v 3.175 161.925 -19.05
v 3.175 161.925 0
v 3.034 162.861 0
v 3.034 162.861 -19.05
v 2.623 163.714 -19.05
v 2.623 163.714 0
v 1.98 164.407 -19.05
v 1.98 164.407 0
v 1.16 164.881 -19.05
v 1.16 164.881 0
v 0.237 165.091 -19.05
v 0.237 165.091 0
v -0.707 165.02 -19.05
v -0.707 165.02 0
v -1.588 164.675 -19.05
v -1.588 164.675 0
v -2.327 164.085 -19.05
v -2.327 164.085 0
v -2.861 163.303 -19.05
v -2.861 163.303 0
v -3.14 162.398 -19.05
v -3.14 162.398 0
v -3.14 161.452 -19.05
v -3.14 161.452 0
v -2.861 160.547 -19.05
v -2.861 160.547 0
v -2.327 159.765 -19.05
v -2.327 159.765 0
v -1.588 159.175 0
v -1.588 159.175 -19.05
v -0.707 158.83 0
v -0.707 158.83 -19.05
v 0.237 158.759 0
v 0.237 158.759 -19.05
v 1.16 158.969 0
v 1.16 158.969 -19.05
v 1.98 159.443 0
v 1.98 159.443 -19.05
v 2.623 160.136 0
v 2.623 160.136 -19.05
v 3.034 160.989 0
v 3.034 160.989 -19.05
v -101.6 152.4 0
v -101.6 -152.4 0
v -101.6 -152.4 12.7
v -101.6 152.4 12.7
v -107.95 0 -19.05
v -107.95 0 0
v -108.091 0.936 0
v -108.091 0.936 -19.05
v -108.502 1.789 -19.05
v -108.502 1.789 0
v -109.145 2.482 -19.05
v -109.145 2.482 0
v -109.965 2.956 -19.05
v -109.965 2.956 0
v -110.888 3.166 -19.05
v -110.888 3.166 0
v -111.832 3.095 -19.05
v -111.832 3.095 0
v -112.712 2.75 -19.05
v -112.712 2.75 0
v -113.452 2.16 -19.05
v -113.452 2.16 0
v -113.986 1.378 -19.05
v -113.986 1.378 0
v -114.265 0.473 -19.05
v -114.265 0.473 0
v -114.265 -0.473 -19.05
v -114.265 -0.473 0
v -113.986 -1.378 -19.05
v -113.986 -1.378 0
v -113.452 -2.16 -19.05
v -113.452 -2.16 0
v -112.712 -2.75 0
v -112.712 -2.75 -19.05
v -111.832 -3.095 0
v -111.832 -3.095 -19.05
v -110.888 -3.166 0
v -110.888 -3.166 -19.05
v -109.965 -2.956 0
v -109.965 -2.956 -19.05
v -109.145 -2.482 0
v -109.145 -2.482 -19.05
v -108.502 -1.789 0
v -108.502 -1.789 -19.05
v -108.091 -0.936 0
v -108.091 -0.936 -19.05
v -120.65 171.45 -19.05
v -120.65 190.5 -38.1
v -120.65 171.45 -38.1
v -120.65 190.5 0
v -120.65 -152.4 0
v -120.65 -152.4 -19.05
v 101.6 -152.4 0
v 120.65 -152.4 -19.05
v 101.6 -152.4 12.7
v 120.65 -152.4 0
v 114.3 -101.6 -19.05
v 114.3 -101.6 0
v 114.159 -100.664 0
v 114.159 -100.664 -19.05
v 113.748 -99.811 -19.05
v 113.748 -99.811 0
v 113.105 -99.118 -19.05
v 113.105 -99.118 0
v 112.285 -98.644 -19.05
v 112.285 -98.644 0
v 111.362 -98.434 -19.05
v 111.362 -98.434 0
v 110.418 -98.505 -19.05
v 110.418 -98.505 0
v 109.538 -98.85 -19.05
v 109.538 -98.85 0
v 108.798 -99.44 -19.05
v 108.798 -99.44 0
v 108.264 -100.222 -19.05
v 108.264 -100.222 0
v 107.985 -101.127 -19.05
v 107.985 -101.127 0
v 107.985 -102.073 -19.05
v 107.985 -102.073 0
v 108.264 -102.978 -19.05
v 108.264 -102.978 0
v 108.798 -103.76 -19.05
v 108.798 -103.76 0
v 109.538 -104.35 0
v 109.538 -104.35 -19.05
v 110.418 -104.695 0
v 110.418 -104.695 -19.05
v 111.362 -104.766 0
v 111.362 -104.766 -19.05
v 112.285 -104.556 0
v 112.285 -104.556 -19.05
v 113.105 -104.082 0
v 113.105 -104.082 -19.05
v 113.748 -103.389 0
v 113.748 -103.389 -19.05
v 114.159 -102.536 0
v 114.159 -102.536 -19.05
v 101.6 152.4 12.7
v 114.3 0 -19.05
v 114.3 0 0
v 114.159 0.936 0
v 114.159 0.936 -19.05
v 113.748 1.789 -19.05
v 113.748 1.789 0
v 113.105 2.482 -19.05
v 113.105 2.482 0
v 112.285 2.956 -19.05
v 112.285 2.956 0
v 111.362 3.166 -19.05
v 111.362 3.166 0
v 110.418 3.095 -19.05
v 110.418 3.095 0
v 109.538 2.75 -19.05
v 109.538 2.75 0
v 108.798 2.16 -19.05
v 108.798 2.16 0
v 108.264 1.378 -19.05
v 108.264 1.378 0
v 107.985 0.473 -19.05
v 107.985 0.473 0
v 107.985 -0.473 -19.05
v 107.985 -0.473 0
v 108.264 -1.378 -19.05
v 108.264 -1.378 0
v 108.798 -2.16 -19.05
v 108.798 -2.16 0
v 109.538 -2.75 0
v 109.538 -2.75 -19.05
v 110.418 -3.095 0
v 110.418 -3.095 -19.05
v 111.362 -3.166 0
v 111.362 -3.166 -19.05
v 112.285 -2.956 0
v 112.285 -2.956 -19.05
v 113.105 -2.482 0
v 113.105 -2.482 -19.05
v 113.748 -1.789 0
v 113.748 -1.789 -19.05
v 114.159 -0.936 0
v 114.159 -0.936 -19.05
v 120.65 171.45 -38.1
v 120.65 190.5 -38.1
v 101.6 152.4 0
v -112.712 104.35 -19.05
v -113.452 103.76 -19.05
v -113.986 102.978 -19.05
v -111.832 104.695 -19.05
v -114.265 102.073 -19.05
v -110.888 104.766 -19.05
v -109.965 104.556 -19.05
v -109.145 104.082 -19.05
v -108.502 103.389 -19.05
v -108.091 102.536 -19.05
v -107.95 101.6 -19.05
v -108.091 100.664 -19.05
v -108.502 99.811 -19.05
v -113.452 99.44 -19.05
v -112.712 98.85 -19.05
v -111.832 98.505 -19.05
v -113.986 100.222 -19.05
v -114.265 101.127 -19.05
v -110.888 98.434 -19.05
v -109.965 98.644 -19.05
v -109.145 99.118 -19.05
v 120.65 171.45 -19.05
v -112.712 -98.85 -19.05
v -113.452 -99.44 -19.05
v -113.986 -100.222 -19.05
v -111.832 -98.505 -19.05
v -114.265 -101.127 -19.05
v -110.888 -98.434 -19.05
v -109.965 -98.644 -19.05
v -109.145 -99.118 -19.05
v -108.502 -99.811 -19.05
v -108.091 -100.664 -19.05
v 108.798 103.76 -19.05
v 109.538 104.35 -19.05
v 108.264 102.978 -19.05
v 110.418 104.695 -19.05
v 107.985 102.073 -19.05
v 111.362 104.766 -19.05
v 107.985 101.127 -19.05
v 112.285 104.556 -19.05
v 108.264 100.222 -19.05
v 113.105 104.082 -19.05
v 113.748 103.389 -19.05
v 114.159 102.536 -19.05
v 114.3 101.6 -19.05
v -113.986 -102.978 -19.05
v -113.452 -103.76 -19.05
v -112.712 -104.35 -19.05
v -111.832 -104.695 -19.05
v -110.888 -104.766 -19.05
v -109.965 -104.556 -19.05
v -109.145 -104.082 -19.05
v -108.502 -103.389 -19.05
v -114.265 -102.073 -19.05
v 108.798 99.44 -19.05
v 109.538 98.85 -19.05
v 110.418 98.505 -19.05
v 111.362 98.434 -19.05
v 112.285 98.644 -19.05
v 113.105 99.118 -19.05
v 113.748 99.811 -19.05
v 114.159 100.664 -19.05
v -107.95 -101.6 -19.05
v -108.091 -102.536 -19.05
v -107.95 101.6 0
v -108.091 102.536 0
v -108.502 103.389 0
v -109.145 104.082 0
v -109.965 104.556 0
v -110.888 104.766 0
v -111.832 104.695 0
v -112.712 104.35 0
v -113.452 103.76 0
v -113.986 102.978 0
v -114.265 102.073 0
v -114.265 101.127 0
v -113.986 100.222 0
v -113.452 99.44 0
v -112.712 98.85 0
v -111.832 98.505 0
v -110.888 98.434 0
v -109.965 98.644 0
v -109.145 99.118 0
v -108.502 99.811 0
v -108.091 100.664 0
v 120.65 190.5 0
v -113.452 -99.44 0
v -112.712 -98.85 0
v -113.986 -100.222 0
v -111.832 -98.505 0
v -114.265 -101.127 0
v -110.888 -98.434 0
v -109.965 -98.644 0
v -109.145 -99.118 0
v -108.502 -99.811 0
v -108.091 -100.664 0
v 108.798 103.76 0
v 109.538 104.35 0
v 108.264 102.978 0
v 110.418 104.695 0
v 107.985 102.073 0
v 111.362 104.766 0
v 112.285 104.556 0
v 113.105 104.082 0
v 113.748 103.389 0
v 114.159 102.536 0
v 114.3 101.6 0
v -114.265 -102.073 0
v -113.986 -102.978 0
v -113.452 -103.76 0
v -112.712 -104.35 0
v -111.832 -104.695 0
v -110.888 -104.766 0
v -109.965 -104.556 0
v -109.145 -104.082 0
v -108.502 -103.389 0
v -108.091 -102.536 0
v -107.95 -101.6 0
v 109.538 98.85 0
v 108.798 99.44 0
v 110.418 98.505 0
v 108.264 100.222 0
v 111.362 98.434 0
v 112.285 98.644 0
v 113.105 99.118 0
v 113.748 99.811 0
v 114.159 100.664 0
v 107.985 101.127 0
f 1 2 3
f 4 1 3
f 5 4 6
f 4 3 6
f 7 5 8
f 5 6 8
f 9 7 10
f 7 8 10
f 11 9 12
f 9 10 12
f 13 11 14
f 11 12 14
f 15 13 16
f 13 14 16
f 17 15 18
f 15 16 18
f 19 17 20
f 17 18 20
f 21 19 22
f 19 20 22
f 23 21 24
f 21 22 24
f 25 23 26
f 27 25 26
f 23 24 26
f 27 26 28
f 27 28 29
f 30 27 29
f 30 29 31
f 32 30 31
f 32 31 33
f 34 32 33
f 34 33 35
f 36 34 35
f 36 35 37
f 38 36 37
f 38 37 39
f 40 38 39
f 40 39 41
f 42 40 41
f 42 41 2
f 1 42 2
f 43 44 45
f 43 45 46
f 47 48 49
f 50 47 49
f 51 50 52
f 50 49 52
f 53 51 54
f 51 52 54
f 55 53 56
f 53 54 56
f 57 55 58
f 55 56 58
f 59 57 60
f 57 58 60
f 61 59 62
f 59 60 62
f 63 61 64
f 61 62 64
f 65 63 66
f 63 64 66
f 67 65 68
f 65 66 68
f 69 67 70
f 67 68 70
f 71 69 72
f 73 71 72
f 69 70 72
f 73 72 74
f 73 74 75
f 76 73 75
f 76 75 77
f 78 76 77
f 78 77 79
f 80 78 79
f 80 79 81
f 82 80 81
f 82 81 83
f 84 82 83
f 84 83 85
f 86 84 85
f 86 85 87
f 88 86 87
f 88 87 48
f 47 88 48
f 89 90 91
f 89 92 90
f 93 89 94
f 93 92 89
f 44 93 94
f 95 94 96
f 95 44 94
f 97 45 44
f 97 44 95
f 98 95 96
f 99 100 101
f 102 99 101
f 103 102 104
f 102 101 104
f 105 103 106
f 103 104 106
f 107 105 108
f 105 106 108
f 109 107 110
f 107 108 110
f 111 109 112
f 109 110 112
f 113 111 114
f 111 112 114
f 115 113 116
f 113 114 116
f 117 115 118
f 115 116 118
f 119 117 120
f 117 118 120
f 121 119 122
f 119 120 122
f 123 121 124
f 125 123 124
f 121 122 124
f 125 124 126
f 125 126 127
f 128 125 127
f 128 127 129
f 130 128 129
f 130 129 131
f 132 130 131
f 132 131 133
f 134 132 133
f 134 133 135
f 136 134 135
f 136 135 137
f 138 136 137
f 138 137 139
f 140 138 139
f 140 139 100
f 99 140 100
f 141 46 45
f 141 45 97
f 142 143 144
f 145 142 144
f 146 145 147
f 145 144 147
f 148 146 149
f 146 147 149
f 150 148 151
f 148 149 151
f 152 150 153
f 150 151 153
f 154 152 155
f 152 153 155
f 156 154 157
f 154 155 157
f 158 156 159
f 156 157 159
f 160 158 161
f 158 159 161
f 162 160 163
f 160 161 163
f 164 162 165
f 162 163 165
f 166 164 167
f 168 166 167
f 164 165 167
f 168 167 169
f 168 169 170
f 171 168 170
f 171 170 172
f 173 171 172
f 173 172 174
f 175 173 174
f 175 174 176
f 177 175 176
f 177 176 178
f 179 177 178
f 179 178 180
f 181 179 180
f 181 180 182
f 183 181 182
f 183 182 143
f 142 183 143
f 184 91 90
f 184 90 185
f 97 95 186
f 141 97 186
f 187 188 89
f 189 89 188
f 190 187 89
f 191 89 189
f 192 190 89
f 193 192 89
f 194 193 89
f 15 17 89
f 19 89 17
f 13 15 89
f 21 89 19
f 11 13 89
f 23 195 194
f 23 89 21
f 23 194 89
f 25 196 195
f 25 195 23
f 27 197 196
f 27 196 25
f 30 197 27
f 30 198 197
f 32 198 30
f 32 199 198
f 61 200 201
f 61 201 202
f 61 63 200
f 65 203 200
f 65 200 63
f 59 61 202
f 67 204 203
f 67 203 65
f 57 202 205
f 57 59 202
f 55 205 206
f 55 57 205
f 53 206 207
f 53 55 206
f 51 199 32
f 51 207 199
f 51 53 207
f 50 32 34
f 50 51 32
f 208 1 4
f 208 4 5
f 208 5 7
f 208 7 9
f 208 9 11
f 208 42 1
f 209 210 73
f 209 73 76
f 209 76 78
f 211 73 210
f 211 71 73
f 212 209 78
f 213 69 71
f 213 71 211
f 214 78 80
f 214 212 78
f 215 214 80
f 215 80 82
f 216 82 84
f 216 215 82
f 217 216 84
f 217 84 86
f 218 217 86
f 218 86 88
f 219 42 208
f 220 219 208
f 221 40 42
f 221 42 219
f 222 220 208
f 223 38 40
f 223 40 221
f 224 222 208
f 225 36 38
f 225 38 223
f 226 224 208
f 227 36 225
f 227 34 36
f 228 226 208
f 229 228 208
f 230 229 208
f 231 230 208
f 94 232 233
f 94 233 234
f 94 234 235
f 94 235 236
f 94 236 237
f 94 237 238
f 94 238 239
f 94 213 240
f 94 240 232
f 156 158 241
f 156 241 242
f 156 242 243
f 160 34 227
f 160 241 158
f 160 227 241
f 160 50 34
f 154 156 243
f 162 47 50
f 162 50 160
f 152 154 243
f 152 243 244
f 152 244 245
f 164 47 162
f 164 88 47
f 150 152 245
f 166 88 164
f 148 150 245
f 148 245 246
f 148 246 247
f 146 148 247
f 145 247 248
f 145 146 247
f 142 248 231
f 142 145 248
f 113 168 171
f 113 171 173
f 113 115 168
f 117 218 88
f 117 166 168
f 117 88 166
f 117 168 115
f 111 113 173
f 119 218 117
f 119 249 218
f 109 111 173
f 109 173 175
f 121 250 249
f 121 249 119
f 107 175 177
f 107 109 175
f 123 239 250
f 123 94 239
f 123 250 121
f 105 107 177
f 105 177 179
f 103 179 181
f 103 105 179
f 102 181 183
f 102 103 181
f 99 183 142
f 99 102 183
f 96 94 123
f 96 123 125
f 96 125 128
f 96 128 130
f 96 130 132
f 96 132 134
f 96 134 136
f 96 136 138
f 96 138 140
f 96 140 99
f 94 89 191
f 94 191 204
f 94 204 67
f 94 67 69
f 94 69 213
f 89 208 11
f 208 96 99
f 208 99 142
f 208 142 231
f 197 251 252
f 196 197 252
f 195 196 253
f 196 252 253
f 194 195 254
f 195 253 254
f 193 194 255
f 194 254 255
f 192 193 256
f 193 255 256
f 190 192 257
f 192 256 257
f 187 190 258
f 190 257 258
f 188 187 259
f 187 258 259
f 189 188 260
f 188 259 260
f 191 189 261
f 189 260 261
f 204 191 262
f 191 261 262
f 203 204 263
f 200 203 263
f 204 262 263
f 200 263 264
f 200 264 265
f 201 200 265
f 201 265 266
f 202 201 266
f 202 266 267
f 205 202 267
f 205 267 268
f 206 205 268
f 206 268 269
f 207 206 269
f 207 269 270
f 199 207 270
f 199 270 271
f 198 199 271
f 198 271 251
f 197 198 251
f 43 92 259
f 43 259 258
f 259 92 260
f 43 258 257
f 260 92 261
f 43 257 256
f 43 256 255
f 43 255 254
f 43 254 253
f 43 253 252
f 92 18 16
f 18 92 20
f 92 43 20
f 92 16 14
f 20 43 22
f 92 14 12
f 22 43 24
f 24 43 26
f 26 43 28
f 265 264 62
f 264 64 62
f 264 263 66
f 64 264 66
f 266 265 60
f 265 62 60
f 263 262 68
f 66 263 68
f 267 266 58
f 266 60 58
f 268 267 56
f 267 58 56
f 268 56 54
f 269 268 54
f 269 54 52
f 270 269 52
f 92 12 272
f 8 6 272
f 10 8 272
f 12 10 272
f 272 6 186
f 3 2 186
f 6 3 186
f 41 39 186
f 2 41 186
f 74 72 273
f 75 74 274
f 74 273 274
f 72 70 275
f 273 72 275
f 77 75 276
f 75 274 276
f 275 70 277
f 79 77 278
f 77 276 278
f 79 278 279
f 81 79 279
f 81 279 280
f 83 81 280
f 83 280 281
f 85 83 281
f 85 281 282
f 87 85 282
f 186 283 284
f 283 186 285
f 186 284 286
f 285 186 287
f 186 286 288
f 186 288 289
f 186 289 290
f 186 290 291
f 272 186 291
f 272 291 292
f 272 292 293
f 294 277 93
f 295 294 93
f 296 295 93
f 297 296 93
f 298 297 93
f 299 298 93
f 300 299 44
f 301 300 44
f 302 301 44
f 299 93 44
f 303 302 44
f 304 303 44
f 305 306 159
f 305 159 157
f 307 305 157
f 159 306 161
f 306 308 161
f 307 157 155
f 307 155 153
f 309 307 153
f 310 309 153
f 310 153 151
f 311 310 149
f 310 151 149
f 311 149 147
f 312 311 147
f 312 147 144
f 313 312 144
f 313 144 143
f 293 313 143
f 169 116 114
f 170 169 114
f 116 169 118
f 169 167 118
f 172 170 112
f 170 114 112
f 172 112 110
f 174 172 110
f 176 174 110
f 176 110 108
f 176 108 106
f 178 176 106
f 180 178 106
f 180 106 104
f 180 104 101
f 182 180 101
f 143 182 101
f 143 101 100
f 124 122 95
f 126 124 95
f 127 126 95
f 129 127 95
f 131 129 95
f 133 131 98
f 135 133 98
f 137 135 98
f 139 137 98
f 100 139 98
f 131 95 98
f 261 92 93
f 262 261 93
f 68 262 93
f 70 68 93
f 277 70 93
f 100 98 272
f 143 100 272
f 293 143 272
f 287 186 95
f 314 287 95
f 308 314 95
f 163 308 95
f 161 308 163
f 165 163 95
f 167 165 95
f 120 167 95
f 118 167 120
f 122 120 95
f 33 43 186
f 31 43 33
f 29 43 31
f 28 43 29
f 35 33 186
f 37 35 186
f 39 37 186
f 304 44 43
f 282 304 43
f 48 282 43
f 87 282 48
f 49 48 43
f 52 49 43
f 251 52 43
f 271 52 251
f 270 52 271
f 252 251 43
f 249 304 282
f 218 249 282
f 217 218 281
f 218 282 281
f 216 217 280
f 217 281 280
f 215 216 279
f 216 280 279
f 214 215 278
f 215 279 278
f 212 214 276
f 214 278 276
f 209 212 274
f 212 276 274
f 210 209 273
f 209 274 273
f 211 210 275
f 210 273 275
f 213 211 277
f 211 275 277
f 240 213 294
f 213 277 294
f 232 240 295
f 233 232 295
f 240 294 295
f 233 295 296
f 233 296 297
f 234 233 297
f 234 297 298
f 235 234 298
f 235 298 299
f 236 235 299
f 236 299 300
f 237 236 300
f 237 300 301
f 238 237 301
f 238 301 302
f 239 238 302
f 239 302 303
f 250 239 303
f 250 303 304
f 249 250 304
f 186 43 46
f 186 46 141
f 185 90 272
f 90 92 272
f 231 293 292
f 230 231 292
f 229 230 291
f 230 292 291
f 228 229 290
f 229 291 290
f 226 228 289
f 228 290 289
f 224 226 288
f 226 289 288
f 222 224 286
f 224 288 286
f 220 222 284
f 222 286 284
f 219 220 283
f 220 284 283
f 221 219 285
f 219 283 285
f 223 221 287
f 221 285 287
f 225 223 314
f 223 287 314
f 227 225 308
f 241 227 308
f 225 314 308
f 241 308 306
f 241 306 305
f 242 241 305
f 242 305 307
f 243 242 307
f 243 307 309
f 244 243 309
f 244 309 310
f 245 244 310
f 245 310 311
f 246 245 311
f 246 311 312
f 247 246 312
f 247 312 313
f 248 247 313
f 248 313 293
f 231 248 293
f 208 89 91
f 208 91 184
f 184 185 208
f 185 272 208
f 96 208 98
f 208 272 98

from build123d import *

# Parameters (mm, degrees)
F0_W     = 203.2
F0_H     = 304.8
F1_DEPTH = 12.7
F2_W     = 241.3
F2_H     = 342.9
F3_DEPTH = 19.05
F4_W     = 241.3
F4_H     = 19.05
F5_DEPTH = 19.05
F6_R     = 3.175
F7_DEPTH = 25.4


with BuildPart() as f1:
    # F0 (on Top) → F1 (new body)
    with BuildSketch(Plane.XY):
        Rectangle(F0_W, F0_H)
    extrude(amount=F1_DEPTH)

    # F2 (on face) → F3 (join)
    with BuildSketch(Plane(origin=(0, 0, 0), x_dir=(1, 0, 0), z_dir=(0, 0, -1))):
        with Locations((0, -19.05)):
            Rectangle(F2_W, F2_H)
    extrude(amount=F3_DEPTH)

    # F4 (on face) → F5 (join)
    with BuildSketch(Plane(origin=(0, 0, -19.05), x_dir=(1, 0, 0), z_dir=(0, 0, -1))):
        with Locations((0, -180.975)):
            Rectangle(F4_W, F4_H)
    extrude(amount=F5_DEPTH)

    # F6 (on face) → F7 (cut)
    with BuildSketch(Plane.XY):
        with Locations((0, 161.925)):
            Circle(F6_R)
        with Locations((111.125, 101.6)):
            Circle(F6_R)
        with Locations((111.125, -101.6)):
            Circle(F6_R)
        with Locations((111.125, 0)):
            Circle(F6_R)
        with Locations((-111.125, 101.6)):
            Circle(F6_R)
        with Locations((-111.125, 0)):
            Circle(F6_R)
        with Locations((-111.125, -101.6)):
            Circle(F6_R)
    extrude(amount=-F7_DEPTH, mode=Mode.SUBTRACT)


solid = f1.part
